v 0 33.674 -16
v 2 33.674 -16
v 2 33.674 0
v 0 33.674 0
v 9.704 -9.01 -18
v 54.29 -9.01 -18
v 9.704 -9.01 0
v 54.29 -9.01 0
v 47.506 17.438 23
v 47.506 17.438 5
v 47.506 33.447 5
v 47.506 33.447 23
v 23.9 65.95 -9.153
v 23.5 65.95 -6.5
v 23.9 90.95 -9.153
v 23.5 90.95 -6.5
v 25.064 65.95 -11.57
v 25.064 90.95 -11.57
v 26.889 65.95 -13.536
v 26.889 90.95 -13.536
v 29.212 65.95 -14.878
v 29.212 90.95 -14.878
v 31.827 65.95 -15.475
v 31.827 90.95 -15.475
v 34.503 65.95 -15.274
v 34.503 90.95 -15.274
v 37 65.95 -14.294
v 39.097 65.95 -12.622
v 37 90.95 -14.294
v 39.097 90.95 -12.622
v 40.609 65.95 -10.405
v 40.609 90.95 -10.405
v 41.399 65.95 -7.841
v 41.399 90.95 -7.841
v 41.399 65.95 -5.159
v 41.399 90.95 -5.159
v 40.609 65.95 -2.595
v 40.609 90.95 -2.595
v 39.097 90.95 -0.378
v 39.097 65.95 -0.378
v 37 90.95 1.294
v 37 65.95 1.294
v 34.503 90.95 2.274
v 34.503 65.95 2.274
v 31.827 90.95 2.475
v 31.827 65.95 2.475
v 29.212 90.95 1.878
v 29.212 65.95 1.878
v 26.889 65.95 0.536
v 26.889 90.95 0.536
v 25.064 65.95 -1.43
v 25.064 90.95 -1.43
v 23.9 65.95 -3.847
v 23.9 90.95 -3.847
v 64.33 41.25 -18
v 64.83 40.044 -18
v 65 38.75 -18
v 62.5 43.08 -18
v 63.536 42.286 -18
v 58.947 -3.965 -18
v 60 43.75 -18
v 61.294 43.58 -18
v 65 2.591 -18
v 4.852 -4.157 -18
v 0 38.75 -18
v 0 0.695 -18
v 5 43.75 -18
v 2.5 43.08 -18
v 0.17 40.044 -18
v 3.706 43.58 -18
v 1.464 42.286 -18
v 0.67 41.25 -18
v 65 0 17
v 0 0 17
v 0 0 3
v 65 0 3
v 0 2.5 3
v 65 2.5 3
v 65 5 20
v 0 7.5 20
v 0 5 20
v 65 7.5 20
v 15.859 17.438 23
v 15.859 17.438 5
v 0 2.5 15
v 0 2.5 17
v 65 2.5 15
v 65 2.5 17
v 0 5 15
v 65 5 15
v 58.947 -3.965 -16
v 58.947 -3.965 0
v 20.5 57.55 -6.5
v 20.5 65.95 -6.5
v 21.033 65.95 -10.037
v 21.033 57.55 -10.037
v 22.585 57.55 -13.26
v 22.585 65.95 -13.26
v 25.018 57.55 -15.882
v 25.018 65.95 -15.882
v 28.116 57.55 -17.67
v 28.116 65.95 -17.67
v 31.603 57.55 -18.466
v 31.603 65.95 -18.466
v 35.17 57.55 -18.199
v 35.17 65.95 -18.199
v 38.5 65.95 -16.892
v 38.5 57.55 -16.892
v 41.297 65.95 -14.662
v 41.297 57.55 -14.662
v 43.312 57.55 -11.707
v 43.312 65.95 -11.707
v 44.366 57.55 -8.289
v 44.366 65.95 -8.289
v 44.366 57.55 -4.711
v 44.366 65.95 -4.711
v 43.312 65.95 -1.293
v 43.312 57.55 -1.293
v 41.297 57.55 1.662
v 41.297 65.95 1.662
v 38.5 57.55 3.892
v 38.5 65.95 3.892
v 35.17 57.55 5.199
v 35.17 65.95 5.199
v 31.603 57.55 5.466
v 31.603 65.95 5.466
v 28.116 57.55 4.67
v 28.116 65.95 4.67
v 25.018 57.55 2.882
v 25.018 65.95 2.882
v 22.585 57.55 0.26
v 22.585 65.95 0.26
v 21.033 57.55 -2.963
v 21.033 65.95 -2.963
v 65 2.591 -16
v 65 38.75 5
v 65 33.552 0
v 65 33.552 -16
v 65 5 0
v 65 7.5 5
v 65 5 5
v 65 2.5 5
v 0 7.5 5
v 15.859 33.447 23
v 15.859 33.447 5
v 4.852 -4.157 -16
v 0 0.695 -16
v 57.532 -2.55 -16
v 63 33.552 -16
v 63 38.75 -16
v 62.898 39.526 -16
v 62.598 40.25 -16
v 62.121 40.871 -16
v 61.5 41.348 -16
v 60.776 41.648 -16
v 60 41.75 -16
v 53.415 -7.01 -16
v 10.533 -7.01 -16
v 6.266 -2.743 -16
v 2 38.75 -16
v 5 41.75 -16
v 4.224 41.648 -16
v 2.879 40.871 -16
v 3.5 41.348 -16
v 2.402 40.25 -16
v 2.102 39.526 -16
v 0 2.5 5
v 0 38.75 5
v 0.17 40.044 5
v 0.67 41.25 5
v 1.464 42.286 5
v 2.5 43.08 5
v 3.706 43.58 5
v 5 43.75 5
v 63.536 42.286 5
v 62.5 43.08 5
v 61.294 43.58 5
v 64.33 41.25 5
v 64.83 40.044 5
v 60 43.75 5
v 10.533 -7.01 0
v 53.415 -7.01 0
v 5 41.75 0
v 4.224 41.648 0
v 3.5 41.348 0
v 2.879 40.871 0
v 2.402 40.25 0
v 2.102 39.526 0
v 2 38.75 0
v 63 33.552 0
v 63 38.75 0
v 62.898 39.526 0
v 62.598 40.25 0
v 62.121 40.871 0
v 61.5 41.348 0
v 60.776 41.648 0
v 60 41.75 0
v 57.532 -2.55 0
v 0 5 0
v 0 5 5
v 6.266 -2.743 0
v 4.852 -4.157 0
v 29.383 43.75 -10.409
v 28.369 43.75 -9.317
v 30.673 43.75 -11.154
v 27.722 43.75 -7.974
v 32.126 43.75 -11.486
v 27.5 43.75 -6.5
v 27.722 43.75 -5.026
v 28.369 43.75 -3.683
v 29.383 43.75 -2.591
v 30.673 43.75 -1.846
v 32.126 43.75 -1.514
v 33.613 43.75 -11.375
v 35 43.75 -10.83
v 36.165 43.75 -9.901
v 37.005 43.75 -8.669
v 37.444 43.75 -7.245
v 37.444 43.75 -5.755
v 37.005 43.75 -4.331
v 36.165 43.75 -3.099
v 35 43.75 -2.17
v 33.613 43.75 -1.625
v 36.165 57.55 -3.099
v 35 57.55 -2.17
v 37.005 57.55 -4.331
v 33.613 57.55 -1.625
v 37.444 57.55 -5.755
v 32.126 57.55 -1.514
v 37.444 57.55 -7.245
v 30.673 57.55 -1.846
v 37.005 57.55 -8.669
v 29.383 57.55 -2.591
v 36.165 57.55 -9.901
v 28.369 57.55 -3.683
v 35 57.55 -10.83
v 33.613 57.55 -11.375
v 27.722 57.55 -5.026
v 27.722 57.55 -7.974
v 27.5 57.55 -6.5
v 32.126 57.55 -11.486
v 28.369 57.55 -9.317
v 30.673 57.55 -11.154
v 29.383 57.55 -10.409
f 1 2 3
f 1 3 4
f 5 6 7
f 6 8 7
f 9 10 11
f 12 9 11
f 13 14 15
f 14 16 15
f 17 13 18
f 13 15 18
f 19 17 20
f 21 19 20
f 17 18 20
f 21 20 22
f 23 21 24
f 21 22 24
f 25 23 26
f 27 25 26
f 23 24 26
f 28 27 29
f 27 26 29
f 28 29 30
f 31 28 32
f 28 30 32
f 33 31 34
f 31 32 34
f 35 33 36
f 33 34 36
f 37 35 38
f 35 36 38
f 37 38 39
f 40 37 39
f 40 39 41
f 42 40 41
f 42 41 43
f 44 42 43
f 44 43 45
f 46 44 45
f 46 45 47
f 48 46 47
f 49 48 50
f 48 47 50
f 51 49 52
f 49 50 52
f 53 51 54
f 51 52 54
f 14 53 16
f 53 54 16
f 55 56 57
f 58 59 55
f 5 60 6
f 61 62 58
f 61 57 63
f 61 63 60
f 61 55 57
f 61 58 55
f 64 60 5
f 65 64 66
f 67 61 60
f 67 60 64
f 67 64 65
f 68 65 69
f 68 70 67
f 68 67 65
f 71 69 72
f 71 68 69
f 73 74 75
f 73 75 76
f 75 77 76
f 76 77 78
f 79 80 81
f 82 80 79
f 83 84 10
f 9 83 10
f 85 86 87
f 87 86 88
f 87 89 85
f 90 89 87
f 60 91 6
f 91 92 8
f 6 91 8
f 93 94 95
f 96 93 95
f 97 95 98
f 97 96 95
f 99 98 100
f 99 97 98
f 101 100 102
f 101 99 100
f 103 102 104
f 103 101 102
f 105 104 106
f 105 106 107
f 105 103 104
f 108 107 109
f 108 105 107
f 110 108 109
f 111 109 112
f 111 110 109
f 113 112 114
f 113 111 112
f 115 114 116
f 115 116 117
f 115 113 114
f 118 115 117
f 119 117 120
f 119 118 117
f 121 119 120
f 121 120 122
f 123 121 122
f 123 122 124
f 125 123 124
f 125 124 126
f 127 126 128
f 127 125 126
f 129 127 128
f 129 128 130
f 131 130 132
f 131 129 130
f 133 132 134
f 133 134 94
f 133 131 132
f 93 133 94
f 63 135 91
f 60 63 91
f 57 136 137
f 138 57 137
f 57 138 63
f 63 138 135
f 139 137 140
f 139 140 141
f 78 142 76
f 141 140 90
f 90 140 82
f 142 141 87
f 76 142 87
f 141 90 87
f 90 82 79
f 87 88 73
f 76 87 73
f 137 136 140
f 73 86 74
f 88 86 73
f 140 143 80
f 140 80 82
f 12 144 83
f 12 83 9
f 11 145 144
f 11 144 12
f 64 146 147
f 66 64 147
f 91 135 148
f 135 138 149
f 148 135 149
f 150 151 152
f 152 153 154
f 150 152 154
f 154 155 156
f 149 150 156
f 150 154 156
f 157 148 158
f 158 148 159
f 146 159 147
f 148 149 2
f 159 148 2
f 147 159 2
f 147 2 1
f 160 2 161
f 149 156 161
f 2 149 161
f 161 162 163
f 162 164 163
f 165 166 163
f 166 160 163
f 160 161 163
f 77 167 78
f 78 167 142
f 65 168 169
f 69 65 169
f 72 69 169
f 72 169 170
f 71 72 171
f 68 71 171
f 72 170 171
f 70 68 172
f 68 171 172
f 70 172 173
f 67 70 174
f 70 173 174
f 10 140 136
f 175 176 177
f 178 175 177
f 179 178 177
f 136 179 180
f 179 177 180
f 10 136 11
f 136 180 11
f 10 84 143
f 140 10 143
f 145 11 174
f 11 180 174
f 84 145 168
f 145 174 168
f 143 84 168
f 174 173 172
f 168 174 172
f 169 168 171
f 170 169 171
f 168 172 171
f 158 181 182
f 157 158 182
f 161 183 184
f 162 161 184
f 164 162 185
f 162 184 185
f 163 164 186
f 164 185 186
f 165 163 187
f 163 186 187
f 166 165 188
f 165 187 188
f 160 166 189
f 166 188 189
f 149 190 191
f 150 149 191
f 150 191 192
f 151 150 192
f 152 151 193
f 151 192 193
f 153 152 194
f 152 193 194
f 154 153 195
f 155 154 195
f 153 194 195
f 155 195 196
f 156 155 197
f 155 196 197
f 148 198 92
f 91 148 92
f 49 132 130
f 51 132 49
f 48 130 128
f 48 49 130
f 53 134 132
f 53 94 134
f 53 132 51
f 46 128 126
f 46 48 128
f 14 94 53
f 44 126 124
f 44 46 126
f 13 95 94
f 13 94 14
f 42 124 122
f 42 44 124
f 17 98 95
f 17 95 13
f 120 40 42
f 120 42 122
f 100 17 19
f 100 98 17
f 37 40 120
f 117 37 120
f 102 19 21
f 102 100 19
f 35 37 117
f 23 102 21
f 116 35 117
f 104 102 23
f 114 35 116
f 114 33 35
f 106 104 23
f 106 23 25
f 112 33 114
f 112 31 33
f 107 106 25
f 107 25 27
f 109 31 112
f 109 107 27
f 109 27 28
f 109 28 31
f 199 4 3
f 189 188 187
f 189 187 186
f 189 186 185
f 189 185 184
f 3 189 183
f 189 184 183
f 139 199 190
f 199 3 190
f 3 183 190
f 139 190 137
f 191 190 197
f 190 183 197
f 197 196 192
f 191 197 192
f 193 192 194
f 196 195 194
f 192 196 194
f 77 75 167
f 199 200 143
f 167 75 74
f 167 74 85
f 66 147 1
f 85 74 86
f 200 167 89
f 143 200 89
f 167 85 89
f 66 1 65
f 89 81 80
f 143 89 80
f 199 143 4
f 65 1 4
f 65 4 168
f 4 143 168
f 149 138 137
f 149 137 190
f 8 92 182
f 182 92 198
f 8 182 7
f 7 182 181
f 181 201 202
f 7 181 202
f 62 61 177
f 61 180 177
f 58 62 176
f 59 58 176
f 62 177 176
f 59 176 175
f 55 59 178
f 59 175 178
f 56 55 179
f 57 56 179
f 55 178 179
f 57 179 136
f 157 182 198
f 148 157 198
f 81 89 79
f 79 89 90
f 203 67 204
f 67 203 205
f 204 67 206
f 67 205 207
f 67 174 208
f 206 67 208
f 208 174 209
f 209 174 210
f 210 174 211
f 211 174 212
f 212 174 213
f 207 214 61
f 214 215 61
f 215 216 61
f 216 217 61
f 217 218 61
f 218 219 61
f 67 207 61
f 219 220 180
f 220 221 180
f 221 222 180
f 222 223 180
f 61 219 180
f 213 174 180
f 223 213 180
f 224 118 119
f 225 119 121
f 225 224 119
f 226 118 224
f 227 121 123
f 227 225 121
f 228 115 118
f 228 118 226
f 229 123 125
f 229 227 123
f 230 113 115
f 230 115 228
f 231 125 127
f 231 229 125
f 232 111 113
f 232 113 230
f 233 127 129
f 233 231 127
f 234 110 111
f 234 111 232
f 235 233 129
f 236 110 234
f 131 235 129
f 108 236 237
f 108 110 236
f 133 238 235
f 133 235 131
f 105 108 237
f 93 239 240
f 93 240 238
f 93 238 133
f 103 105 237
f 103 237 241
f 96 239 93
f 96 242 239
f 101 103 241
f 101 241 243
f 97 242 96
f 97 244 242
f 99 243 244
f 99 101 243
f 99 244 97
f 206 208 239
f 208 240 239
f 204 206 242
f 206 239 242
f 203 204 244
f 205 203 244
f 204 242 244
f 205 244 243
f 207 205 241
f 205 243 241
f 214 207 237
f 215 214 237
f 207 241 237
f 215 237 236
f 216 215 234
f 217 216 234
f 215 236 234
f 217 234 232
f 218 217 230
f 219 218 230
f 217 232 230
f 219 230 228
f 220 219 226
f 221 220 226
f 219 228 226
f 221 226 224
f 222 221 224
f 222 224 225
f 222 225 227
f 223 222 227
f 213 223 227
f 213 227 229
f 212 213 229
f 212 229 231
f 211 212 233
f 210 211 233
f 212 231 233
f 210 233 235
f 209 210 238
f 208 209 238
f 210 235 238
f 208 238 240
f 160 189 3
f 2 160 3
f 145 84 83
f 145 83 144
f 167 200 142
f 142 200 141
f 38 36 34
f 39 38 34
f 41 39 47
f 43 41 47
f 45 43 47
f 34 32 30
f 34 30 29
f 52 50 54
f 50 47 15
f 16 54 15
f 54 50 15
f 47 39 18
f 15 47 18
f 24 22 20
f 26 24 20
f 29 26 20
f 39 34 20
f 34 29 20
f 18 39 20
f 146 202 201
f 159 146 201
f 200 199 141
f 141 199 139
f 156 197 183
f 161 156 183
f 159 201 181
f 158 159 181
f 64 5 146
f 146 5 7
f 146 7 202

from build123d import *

# Parameters (mm, degrees)
BOSS_EXTRUDE1_DEPTH = 5
SKETCH1_3_W         = 65
SKETCH1_3_H         = 2.5
BOSS_EXTRUDE2_DEPTH = 20
SKETCH2_W           = 65
SKETCH2_H           = 2.5
BOSS_EXTRUDE3_DEPTH = 5
SKETCH2_3_W         = 65
SKETCH2_3_H         = 2.5
BOSS_EXTRUDE4_DEPTH = 7
SKETCH1_5_W         = 31.646470679
SKETCH1_5_H         = 16.00939105
BOSS_EXTRUDE5_DEPTH = 23
BOSS_EXTRUDE6_START = 16
BOSS_EXTRUDE6_DEPTH = 16
BOSS_EXTRUDE7_DEPTH = 2


with BuildPart() as part:
    # Sketch1 → Boss-Extrude1 (new body)
    with BuildSketch(Plane.XY):
        with BuildLine():
            Line((0, 38.75), (0, 7.5))
            Line((0, 7.5), (65, 7.5))
            Line((65, 7.5), (65, 38.75))
            ThreePointArc((65, 38.75), (63.535533906, 42.285533906), (60, 43.75))
            Line((60, 43.75), (5, 43.75))
            ThreePointArc((5, 43.75), (1.464466094, 42.285533906), (0, 38.75))
        make_face()
    extrude(amount=BOSS_EXTRUDE1_DEPTH)

    # Sketch1<3> → Boss-Extrude2 (add)
    with BuildSketch(Plane.XY):
        with Locations((32.5, 6.25)):
            Rectangle(SKETCH1_3_W, SKETCH1_3_H)
    extrude(amount=BOSS_EXTRUDE2_DEPTH)

    # Sketch2 → Boss-Extrude3 (add, symmetric)
    with BuildSketch(Plane.XY.offset(10)):
        with Locations((32.5, 3.75)):
            Rectangle(SKETCH2_W, SKETCH2_H)
    extrude(amount=BOSS_EXTRUDE3_DEPTH, both=True)

    # Sketch2<3> → Boss-Extrude4 (add, symmetric)
    with BuildSketch(Plane.XY.offset(10)):
        with Locations((32.5, 1.25)):
            Rectangle(SKETCH2_3_W, SKETCH2_3_H)
    extrude(amount=BOSS_EXTRUDE4_DEPTH, both=True)

    # Sketch1<5> → Boss-Extrude5 (add)
    with BuildSketch(Plane.XY):
        with Locations((31.682365604, 25.44274044)):
            Rectangle(SKETCH1_5_W, SKETCH1_5_H)
    extrude(amount=BOSS_EXTRUDE5_DEPTH)

    # Sketch3 → Boss-Extrude6 (add)
    with BuildSketch(Plane(origin=(0, 0, 0), x_dir=(-1, 0, 0), z_dir=(0, 0, -1)).offset(BOSS_EXTRUDE6_START)):
        with BuildLine():
            Line((-2, 33.67400262), (0, 33.67400262))
            Line((0, 33.67400262), (0, 38.75))
            ThreePointArc((0, 38.75), (-1.464466094, 42.285533906), (-5, 43.75))
            Line((-5, 43.75), (-60, 43.75))
            ThreePointArc((-60, 43.75), (-63.535533906, 42.285533906), (-65, 38.75))
            Line((-65, 38.75), (-65, 33.551986264))
            Line((-65, 33.551986264), (-63, 33.551986264))
            Line((-63, 33.551986264), (-63, 38.75))
            ThreePointArc((-63, 38.75), (-62.121320344, 40.871320344), (-60, 41.75))
            Line((-60, 41.75), (-5, 41.75))
            ThreePointArc((-5, 41.75), (-2.878679656, 40.871320344), (-2, 38.75))
            Line((-2, 38.75), (-2, 33.67400262))
        make_face()
        Polygon((-9.704230369, -9.009552441), (-4.852115184, -4.157437257), (-6.266328747, -2.743223694), (-10.532657494, -7.009552441), (-53.41460101, -7.009552441), (-57.531707428, -2.550119806), (-58.947047068, -3.965459446), (-54.290161463, -9.009552441), align=None)
    extrude(amount=-BOSS_EXTRUDE6_DEPTH)


with BuildPart() as boss_extrude6_piece_1:
    # of the separate pieces the step leaves, piece 1, a body of its own (boss_extrude6_pieces)
    add(part.part.solids().sort_by_distance((65, 2.5, 5))[0])



with BuildPart() as boss_extrude6_piece_2:
    # of the separate pieces the step leaves, piece 2, a body of its own (boss_extrude6_pieces)
    add(part.part.solids().sort_by_distance((58.947047068, -3.965459446, -16))[0])


with BuildPart() as boss_extrude6_piece_1_1:
    add(boss_extrude6_piece_1.part)

    add(boss_extrude6_piece_2.part)  # Boss-Extrude7 merges Boss-Extrude6 piece 2
    # Sketch4 → Boss-Extrude7 (add)
    with BuildSketch(Plane(origin=(0, 0, -16), x_dir=(-1, 0, 0), z_dir=(0, 0, -1))):
        with BuildLine():
            Line((-54.290161463, -9.009552441), (-9.704230369, -9.009552441))
            Line((-9.704230369, -9.009552441), (0, 0.694677928))
            Line((0, 0.694677928), (0, 38.75))
            ThreePointArc((0, 38.75), (-1.464466094, 42.285533906), (-5, 43.75))
            Line((-5, 43.75), (-60, 43.75))
            ThreePointArc((-60, 43.75), (-63.535533906, 42.285533906), (-65, 38.75))
            Line((-65, 38.75), (-65, 2.590780084))
            Line((-65, 2.590780084), (-54.290161463, -9.009552441))
        make_face()
    extrude(amount=BOSS_EXTRUDE7_DEPTH)

    # Sketch5 → Revolve1 (revolve)
    with BuildSketch(Plane.XY.offset(-6.5)):
        Polygon((32.5, 90.95), (23.5, 90.95), (23.5, 65.95), (20.5, 65.95), (20.5, 57.55), (27.5, 57.55), (27.5, 43.75), (32.5, 43.75), align=None)
    revolve(axis=Axis((32.5, 92.408225654, -6.5), (0, -1, 0)))


solid = boss_extrude6_piece_1_1.part
